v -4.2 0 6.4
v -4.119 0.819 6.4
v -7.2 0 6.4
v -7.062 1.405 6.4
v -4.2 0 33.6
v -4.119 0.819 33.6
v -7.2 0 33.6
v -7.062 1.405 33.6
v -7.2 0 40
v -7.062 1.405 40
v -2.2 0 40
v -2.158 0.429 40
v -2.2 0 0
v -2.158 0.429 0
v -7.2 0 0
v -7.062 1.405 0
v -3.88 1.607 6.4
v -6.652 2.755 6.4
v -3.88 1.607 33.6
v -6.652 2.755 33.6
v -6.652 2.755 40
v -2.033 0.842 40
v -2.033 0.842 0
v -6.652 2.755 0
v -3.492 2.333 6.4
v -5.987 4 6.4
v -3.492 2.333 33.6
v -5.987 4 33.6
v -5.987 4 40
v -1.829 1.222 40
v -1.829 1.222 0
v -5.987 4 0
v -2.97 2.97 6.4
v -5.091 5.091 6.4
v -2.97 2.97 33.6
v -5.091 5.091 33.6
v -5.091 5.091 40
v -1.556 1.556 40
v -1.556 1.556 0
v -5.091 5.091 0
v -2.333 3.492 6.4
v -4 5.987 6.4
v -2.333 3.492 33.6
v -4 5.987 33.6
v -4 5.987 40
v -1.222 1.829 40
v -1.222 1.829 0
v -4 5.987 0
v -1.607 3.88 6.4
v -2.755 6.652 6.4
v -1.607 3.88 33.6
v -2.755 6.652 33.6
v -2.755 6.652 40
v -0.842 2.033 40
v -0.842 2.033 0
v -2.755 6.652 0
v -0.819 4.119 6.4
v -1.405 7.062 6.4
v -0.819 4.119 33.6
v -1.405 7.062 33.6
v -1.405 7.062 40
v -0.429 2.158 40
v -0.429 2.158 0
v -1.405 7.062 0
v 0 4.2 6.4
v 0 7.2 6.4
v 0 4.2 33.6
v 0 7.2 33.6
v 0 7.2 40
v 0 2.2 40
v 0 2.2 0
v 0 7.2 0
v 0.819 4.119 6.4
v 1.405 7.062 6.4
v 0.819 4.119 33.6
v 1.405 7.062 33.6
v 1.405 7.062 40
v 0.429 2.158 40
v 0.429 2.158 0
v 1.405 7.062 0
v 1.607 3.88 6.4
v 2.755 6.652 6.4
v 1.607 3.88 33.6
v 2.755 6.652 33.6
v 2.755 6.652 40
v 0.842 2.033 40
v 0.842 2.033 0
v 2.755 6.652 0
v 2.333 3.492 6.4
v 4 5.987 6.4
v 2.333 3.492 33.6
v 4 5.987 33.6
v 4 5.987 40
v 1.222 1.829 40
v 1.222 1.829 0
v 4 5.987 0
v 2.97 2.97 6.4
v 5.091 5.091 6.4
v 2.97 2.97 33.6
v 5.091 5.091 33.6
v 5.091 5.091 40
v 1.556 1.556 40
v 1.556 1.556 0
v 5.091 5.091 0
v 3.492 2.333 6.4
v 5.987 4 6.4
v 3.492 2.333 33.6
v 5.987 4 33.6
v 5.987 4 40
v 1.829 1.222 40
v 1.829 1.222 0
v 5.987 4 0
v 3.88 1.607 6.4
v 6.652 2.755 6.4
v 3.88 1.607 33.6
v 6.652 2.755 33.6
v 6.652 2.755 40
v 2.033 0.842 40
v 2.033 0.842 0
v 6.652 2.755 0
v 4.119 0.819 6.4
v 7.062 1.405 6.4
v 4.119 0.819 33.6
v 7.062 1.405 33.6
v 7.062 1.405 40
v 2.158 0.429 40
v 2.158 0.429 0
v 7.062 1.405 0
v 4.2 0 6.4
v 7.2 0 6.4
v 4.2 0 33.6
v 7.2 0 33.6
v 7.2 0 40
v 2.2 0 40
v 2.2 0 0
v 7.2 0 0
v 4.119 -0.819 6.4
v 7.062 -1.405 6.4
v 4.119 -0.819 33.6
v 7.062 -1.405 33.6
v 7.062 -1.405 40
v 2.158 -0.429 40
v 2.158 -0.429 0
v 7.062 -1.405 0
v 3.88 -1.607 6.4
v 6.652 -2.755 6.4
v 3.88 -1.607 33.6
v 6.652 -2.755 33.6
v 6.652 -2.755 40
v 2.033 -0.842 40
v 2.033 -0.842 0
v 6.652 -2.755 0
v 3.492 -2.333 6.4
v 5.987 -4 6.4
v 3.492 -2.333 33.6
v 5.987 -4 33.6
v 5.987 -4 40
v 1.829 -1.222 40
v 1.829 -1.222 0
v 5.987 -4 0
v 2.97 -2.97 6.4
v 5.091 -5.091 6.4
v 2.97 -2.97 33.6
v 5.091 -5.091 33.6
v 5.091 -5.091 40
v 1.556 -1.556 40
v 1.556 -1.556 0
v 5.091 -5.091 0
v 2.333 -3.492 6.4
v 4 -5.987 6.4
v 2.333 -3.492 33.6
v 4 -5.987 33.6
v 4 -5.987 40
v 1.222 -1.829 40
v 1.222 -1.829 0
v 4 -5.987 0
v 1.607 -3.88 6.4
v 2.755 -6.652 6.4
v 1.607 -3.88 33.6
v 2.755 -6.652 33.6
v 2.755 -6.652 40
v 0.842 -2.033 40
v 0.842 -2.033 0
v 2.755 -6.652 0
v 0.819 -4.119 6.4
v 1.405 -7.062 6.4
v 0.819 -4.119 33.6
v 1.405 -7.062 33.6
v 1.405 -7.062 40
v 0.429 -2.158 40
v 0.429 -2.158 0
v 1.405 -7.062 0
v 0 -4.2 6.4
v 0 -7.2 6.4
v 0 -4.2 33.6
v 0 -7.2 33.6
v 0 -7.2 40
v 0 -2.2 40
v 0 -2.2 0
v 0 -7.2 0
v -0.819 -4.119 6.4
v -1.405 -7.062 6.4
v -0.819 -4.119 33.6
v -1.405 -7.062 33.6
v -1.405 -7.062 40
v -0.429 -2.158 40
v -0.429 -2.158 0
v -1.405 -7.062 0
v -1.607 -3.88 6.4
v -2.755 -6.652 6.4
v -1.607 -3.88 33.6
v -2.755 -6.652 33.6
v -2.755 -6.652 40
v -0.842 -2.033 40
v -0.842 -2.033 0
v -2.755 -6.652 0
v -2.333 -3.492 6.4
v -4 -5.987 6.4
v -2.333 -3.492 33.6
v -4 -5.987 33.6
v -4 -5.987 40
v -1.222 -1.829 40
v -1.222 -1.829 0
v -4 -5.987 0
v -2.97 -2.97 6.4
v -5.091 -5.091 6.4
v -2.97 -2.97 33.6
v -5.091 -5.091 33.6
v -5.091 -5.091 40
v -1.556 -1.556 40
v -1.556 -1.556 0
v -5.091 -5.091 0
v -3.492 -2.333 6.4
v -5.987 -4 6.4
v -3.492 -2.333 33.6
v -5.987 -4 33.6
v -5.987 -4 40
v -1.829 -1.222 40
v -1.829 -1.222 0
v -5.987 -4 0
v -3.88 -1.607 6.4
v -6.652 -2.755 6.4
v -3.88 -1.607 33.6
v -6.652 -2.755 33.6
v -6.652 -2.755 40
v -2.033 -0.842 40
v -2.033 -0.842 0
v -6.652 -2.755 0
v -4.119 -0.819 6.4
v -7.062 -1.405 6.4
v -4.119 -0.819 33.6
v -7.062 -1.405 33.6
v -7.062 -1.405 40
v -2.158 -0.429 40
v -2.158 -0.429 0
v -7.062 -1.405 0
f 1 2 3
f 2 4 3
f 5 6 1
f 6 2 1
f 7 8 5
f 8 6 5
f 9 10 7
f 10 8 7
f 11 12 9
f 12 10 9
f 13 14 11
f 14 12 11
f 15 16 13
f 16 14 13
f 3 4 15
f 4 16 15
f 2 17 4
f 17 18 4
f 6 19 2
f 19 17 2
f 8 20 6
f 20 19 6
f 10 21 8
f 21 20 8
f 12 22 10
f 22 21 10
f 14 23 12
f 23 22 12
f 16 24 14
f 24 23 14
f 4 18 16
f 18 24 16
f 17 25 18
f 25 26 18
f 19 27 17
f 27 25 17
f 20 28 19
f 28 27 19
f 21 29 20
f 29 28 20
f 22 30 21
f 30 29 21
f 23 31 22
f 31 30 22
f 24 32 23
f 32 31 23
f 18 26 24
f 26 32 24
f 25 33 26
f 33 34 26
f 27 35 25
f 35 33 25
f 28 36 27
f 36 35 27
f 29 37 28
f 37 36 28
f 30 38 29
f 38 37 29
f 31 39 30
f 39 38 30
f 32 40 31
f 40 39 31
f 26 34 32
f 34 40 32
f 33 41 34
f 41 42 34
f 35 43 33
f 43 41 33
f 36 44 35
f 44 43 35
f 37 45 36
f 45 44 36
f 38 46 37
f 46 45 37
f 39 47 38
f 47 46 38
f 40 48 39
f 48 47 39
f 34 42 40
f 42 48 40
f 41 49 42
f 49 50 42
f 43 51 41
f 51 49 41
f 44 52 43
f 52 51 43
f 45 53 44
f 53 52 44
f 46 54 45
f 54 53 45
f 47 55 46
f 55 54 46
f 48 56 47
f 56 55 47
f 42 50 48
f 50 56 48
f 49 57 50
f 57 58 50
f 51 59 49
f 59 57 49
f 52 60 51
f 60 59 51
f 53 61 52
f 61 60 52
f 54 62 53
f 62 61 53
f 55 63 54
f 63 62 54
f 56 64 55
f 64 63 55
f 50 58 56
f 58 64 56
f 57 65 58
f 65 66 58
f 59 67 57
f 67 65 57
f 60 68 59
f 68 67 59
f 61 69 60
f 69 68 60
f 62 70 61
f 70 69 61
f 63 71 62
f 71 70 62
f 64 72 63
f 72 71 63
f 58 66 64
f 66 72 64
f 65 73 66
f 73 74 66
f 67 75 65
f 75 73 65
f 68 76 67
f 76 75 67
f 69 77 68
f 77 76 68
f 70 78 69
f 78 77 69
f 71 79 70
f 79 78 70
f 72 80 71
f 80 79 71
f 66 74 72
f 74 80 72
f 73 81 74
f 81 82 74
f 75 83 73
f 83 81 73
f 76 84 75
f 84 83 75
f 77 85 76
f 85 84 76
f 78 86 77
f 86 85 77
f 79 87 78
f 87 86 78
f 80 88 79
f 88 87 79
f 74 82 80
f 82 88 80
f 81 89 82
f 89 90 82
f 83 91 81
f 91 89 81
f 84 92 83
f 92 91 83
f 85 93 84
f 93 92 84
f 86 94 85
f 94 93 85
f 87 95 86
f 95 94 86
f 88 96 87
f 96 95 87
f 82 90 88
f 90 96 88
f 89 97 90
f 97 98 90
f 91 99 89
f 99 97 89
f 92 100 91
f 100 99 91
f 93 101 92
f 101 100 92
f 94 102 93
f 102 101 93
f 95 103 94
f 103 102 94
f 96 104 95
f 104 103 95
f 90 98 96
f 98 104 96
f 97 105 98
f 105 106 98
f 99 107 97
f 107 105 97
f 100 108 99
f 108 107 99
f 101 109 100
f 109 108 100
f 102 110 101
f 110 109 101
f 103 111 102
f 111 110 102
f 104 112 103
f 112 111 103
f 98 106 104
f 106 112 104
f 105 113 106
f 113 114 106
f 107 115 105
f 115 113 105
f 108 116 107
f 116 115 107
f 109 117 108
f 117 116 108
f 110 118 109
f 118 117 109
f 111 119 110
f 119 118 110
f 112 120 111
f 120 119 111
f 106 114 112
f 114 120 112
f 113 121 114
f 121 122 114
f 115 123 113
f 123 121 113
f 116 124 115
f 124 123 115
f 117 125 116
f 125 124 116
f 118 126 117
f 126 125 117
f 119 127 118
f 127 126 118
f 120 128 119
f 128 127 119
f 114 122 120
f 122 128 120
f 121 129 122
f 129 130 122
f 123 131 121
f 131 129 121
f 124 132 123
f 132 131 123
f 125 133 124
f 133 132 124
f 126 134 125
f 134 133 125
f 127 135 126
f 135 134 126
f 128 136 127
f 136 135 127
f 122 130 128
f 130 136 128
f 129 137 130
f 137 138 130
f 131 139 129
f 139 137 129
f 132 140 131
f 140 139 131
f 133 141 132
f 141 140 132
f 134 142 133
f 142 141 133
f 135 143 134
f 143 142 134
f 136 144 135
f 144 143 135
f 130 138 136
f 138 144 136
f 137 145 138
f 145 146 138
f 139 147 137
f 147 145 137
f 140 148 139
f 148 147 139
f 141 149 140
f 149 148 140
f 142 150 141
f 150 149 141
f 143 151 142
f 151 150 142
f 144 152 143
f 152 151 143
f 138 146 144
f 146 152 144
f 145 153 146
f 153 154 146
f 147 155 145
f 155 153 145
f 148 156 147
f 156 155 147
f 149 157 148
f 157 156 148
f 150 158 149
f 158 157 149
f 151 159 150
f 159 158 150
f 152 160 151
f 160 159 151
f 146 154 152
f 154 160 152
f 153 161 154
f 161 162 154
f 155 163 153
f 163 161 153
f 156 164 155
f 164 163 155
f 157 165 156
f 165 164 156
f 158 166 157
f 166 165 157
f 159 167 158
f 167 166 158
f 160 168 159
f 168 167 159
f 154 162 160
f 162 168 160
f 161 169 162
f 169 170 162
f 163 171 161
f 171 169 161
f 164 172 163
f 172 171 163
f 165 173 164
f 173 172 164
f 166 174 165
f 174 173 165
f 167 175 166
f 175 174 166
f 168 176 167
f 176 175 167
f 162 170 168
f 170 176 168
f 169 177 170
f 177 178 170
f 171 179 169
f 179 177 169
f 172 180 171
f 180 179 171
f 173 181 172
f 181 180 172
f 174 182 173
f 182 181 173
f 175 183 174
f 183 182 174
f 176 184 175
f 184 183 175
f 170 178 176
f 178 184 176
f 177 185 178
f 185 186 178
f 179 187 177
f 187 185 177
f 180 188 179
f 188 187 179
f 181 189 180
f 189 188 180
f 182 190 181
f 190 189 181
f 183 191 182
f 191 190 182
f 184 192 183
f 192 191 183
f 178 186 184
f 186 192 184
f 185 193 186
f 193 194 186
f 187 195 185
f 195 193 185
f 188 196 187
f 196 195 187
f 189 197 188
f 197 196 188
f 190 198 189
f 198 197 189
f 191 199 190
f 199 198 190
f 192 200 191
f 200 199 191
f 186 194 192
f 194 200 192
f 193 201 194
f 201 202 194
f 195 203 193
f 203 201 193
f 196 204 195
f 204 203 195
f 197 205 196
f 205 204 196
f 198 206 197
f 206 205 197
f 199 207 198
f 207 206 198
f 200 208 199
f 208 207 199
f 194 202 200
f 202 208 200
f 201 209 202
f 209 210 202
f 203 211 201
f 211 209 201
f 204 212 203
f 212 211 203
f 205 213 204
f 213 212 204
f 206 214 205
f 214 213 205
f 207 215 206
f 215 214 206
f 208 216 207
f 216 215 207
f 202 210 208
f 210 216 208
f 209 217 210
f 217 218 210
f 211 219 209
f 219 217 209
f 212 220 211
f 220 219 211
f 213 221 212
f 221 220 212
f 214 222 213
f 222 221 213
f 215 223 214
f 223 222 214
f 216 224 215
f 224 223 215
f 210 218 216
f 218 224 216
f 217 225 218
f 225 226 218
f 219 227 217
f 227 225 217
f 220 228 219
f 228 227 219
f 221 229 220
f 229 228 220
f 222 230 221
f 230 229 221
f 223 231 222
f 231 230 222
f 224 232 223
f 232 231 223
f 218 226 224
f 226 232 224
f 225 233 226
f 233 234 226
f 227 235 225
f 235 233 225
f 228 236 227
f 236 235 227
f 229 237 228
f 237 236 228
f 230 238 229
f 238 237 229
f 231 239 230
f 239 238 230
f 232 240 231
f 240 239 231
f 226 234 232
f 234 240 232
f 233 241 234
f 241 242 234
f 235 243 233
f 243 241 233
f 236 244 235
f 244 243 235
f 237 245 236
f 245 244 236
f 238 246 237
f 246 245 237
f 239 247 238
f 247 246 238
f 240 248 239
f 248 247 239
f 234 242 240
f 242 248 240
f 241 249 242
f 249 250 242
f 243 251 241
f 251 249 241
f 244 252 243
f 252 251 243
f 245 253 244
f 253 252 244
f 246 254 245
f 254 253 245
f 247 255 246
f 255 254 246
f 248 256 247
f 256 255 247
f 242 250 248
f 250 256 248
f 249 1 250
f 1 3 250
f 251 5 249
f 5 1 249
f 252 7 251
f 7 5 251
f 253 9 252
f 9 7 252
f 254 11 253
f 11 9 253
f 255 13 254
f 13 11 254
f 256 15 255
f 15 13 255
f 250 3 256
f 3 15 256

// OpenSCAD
$fn = 32;

// ----------------------------------------------------------------------
// Profiled standoff: spool spacer, 40 mm long, bore 4.4 mm
// ----------------------------------------------------------------------

// --- parameters (mm) ---
revolve_angle = 360;      // full turn around the Z axis
profile_points = 8;       // points of the closed outline

profile = [[2.2, 0], [7.2, 0], [7.2, 6.4], [4.2, 6.4], [4.2, 33.6], [7.2, 33.6], [7.2, 40], [2.2, 40]];  // single closed polygon, 8 points, counter clockwise

// --- the one profile operation ---
rotate_extrude(angle = revolve_angle) polygon(points = profile);
